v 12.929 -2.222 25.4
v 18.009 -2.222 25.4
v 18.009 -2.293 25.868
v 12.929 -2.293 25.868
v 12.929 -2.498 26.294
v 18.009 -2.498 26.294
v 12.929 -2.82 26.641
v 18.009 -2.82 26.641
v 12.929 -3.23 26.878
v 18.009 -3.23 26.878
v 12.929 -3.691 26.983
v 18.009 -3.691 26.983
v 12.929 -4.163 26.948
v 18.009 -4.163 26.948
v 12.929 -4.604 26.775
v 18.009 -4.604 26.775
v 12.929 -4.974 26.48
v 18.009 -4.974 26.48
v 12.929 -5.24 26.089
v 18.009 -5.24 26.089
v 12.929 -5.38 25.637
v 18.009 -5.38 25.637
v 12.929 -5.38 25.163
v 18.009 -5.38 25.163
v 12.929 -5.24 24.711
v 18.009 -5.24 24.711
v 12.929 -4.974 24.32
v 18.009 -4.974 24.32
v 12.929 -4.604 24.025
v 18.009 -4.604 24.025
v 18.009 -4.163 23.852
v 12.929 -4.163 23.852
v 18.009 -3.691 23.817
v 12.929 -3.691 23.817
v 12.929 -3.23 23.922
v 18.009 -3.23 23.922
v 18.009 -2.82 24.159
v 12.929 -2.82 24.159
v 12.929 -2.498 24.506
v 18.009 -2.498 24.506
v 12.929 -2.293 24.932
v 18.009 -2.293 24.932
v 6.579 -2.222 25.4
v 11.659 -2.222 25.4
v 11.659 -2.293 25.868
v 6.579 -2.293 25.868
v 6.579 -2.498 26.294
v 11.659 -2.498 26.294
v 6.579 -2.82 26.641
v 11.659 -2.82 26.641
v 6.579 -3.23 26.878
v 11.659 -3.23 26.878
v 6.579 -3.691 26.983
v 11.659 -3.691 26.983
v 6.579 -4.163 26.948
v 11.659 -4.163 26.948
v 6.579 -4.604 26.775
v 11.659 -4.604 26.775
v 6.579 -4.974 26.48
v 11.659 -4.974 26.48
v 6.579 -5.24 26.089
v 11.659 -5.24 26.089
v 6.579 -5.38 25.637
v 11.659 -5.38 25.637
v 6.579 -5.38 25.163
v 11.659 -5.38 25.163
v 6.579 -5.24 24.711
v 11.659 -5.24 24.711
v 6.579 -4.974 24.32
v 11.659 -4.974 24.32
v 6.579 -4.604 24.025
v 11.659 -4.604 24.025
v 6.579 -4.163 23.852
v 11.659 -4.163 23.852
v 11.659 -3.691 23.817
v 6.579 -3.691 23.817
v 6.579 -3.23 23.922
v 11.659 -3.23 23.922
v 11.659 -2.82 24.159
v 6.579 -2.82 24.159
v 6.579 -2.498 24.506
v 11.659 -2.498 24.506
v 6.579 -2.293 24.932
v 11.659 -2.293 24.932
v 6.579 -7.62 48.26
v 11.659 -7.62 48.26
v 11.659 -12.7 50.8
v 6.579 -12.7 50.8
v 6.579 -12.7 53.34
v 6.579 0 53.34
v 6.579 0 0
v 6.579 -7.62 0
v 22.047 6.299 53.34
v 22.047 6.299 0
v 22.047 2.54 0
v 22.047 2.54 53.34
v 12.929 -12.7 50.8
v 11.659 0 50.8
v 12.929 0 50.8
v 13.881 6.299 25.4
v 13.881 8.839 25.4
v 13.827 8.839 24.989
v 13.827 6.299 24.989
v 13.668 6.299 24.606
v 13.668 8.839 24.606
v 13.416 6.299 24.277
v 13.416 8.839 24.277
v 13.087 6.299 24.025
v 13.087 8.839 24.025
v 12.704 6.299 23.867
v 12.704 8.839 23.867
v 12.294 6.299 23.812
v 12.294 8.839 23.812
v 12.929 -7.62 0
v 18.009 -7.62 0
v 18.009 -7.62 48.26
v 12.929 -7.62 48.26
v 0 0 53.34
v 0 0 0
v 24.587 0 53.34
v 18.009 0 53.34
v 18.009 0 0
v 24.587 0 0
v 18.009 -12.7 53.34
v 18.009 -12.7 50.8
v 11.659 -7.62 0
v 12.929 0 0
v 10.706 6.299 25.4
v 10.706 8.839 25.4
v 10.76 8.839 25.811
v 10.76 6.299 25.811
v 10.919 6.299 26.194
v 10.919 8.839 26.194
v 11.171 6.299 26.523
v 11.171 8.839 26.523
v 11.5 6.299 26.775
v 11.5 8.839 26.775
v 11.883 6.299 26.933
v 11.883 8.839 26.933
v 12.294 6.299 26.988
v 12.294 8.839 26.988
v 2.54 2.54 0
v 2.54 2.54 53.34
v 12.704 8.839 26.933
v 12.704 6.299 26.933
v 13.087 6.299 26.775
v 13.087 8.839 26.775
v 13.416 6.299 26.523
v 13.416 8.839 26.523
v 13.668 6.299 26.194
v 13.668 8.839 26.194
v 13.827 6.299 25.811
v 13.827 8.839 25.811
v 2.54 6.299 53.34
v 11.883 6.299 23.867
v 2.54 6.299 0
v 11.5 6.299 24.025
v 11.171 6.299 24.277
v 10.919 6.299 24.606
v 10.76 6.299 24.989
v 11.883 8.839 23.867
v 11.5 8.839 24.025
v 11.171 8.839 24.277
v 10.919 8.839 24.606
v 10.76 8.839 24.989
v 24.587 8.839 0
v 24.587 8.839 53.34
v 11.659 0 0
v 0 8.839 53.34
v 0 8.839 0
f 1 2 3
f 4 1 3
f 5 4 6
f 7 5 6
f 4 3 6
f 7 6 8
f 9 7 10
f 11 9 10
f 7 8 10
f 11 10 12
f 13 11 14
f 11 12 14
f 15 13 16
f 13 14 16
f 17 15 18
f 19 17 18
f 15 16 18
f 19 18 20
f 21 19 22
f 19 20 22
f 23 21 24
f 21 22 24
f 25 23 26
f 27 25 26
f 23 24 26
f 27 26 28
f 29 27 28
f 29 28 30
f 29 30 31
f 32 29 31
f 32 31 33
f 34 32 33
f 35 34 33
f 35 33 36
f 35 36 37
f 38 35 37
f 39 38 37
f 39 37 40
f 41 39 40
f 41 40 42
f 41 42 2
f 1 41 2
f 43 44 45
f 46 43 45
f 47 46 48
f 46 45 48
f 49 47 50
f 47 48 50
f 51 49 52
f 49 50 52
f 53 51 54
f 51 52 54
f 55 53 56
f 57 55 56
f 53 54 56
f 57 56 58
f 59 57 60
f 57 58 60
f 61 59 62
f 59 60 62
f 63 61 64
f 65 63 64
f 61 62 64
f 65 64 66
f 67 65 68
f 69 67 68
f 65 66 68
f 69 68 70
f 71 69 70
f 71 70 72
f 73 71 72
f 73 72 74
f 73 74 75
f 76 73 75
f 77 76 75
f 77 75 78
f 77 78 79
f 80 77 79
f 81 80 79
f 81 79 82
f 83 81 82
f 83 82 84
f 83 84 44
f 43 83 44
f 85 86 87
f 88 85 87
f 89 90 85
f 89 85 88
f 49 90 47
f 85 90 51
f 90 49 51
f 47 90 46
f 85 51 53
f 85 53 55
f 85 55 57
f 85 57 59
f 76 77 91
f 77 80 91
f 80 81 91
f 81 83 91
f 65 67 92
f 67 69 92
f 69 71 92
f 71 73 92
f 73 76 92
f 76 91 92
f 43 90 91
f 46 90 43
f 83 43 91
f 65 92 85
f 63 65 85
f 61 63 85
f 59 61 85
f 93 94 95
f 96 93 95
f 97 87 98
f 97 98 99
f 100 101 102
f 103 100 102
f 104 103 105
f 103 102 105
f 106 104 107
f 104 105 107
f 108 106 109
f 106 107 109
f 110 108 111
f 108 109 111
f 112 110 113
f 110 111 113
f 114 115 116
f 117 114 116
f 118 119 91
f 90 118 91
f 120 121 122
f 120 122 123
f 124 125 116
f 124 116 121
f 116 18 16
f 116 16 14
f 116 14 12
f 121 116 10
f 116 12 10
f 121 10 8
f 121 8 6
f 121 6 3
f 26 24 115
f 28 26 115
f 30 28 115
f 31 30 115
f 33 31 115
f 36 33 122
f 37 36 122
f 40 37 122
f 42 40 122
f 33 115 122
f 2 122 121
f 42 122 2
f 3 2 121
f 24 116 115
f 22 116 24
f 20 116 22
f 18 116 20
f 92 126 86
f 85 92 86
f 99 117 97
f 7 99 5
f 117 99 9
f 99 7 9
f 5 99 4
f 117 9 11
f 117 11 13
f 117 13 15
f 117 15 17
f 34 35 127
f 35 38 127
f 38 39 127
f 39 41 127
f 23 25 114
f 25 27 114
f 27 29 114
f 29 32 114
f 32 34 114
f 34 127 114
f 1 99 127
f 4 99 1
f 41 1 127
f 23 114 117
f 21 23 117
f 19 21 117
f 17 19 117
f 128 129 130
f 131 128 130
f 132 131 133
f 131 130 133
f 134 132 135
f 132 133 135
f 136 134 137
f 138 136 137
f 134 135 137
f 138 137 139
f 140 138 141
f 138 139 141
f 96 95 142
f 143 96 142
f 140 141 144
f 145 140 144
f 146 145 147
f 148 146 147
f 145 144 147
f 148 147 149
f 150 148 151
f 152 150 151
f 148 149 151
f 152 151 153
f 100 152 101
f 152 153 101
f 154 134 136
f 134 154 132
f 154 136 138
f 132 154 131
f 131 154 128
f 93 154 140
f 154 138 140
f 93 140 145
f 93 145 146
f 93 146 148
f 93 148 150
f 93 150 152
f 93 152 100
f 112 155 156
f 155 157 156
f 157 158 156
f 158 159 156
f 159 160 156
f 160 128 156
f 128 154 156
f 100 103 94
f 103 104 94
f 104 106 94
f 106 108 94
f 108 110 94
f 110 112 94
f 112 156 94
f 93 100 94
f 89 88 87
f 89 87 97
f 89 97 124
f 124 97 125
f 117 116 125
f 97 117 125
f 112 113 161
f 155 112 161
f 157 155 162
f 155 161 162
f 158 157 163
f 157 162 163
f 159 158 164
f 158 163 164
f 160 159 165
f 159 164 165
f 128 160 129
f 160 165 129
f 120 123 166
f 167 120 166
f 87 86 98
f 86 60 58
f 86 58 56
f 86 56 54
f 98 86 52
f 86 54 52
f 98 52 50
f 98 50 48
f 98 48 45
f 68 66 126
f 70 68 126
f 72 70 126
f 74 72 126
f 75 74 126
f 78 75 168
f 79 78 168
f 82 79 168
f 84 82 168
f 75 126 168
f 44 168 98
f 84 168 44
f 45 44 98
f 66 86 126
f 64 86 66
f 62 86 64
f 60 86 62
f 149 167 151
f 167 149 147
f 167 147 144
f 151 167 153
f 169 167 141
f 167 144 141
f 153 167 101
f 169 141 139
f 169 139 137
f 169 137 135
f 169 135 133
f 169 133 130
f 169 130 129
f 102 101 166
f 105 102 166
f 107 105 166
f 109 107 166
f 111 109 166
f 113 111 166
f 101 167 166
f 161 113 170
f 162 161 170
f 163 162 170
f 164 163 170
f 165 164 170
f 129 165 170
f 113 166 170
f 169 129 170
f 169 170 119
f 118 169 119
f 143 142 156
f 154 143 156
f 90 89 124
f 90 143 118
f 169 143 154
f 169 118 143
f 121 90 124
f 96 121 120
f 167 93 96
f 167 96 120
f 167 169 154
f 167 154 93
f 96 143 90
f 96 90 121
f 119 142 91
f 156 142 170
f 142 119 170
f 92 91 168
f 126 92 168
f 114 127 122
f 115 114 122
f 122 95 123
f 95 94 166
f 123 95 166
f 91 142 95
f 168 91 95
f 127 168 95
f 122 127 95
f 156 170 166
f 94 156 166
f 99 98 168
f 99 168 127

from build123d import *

# Parameters (mm, degrees)
F1_DEPTH = 53.34
F2_R     = 1.5875
F3_DEPTH = 25.4
F4_W     = 1.27
F4_H     = 5.08
F4_H_2   = 7.62
F5_DEPTH = 50.8
F7_DEPTH = 5.08


with BuildPart() as f1:
    # F0 (on Top) → F1 (new body)
    with BuildSketch(Plane.XY):
        Polygon((12.2936, 0), (6.5786, 0), (6.5786, -12.7), (18.0086, -12.7), (18.0086, 0), align=None)
        Polygon((0, 8.8392), (0, 0), (6.5786, 0), (12.2936, 0), (12.2936, 2.54), (2.54, 2.54), (2.54, 6.2992), (5.08, 6.2992), (12.2936, 6.2992), (12.2936, 8.8392), (5.08, 8.8392), align=None)
        Polygon((12.2936, 2.54), (12.2936, 0), (18.0086, 0), (24.5872, 0), (24.5872, 8.8392), (19.5072, 8.8392), (12.2936, 8.8392), (12.2936, 6.2992), (19.5072, 6.2992), (22.0472, 6.2992), (22.0472, 2.54), align=None)
    extrude(amount=F1_DEPTH)

    # F2 (on face) → F3 (cut)
    with BuildSketch(Plane.YZ.offset(18.0086)):
        Polygon((-7.62, 48.26), (-12.7, 50.8), (-12.7, 0), (-7.62, 0), align=None)
        with Locations((-3.81, 25.4)):
            Circle(F2_R)
    extrude(amount=-F3_DEPTH, mode=Mode.SUBTRACT)

    # F4 (on face) → F5 (cut)
    with BuildSketch(Plane(origin=(0, 0, 0), x_dir=(1, 0, 0), z_dir=(0, 0, -1))):
        with Locations((12.2936, 10.16)):
            Rectangle(F4_W, F4_H)
        with Locations((12.2936, 3.81)):
            Rectangle(F4_W, F4_H_2)
    extrude(amount=-F5_DEPTH, mode=Mode.SUBTRACT)

    # F6 (on face) → F7 (cut)
    with BuildSketch(Plane(origin=(0, 8.8392, 0), x_dir=(-1, 0, 0), z_dir=(0, 1, 0))):
        with BuildLine():
            ThreePointArc((-10.7061, 25.4), (-11.1710679849, 26.5225320151), (-12.2936, 26.9875))
            Line((-12.2936, 26.9875), (-12.2936, 25.4))
            Line((-12.2936, 25.4), (-10.7061, 25.4))
        make_face()
        with BuildLine():
            Line((-12.2936, 25.4), (-12.2936, 26.9875))
            ThreePointArc((-12.2936, 26.9875), (-13.4161320151, 26.5225320151), (-13.8811, 25.4))
            Line((-13.8811, 25.4), (-12.2936, 25.4))
        make_face()
        with BuildLine():
            Line((-10.7061, 25.4), (-12.2936, 25.4))
            Line((-12.2936, 25.4), (-12.2936, 23.8125))
            ThreePointArc((-12.2936, 23.8125), (-11.1710679849, 24.2774679849), (-10.7061, 25.4))
        make_face()
        with BuildLine():
            Line((-12.2936, 23.8125), (-12.2936, 25.4))
            Line((-12.2936, 25.4), (-13.8811, 25.4))
            ThreePointArc((-13.8811, 25.4), (-13.4161320151, 24.2774679849), (-12.2936, 23.8125))
        make_face()
    extrude(amount=-F7_DEPTH, mode=Mode.SUBTRACT)


solid = f1.part
